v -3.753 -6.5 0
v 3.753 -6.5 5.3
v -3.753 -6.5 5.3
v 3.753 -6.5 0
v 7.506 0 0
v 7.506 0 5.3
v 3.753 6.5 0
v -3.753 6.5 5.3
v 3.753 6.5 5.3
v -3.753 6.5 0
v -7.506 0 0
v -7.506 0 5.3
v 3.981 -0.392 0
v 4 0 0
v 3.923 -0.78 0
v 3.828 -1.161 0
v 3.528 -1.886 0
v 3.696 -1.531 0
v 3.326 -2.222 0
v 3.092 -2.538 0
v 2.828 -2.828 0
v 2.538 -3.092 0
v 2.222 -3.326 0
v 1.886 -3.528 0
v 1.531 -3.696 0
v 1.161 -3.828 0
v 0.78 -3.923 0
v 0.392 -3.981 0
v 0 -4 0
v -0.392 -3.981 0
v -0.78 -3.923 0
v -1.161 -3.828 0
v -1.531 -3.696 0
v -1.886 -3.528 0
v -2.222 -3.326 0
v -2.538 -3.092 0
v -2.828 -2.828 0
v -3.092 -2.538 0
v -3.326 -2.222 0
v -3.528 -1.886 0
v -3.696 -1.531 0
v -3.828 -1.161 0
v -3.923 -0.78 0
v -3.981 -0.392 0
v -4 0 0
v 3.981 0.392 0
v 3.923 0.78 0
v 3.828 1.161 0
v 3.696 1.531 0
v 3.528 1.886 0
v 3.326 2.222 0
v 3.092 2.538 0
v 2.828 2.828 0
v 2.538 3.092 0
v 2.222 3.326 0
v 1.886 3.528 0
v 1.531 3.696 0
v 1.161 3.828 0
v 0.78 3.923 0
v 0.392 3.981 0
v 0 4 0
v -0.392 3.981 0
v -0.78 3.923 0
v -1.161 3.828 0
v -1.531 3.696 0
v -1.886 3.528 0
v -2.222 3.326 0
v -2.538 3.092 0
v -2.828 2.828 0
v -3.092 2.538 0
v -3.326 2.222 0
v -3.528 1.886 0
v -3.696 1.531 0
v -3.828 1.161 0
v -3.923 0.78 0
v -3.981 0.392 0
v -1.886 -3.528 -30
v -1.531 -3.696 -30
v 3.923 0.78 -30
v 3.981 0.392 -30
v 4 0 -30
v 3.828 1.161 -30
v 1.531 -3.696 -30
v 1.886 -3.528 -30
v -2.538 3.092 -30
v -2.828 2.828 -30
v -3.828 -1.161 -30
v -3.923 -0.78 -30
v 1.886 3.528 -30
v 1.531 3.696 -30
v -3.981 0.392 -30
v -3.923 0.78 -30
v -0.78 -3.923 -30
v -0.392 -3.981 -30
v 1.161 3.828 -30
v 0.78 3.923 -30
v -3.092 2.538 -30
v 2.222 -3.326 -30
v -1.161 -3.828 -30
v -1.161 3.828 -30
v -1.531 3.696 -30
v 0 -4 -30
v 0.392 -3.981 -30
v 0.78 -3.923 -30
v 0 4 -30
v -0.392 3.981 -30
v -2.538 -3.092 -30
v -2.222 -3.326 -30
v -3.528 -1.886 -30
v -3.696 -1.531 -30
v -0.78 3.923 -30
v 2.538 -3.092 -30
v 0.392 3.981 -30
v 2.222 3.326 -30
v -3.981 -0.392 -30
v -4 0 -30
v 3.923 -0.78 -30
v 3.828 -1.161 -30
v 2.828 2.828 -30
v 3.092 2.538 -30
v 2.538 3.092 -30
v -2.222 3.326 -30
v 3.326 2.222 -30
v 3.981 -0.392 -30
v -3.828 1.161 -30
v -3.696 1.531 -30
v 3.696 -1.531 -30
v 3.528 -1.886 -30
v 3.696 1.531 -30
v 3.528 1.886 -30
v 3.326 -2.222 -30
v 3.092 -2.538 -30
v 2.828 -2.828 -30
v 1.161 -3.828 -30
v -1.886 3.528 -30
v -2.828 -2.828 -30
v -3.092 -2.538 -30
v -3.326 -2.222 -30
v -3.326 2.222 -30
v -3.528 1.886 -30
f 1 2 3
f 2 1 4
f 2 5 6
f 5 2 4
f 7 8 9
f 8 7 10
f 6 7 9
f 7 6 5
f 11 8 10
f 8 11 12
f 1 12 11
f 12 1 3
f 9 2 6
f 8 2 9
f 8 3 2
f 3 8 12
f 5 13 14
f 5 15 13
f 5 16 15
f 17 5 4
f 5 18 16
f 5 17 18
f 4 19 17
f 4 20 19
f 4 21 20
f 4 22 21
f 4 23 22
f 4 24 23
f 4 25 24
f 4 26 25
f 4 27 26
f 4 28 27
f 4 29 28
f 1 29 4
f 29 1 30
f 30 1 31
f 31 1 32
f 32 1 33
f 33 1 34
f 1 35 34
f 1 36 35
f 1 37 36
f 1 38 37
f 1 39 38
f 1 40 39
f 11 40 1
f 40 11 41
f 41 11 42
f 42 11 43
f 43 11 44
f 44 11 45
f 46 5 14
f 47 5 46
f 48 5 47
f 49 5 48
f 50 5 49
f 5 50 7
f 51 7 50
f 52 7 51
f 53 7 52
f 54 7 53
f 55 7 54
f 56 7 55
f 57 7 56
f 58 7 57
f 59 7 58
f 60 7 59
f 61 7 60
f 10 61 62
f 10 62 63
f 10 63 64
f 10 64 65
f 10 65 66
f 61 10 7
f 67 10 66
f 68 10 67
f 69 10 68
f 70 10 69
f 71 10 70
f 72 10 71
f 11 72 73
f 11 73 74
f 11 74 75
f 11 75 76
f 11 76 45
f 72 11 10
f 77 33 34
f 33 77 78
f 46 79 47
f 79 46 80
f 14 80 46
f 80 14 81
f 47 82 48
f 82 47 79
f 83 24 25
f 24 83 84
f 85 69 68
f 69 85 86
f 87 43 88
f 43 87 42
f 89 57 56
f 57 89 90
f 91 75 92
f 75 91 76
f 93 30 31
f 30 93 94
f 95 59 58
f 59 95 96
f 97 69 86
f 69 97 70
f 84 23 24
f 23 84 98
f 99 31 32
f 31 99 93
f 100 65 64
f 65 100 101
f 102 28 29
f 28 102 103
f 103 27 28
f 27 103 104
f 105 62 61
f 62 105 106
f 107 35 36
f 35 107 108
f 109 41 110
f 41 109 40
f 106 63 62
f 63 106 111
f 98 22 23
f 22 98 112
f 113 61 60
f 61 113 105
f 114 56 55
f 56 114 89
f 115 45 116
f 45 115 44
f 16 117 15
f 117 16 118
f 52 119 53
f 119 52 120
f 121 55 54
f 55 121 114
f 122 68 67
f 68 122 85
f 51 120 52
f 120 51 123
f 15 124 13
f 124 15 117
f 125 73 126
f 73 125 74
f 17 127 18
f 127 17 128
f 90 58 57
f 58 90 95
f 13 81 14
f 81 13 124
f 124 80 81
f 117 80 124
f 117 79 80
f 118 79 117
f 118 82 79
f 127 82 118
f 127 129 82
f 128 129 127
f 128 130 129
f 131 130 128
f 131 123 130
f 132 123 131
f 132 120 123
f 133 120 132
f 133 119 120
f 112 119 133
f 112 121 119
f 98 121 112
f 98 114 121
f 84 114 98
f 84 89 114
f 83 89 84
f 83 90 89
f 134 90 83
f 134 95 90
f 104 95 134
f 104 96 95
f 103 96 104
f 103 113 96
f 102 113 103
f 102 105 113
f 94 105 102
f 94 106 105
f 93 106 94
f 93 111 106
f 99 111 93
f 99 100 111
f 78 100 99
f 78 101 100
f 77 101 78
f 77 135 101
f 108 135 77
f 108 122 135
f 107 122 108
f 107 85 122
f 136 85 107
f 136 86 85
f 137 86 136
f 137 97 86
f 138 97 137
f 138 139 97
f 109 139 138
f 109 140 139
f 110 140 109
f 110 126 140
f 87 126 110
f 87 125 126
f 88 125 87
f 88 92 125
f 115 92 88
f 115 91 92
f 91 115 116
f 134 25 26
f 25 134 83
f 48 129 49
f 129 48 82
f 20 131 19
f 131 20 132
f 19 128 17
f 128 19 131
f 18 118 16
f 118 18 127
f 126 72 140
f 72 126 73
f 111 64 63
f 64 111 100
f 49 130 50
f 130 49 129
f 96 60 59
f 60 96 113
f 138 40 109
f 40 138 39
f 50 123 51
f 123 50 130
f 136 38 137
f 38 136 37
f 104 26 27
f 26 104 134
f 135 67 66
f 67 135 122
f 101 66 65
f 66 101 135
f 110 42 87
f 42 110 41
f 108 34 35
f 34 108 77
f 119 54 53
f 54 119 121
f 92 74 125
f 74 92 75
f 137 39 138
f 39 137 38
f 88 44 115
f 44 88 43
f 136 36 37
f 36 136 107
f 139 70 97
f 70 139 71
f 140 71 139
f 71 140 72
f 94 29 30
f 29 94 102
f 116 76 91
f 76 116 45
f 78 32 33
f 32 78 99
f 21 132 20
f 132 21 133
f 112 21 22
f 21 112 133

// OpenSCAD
// M8 六角ボルト

// 頭部
// 対辺距離 13mm → 外接円直径 = 13 / cos(30) = 15.011mm
head_af = 13;          // across-flats
head_height = 5.3;
head_d = head_af / cos(30);

// シャンク
shank_d = 8;
shank_length = 30;

// 頭部 (底面が z=0、上方向に伸びる)
translate([0, 0, head_height/2])
    cylinder(h = head_height, d = head_d, center = true, $fn = 6);

// シャンク (z<0 側へ伸びる)
translate([0, 0, -shank_length])
    cylinder(h = shank_length, d = shank_d, $fn = 64);
